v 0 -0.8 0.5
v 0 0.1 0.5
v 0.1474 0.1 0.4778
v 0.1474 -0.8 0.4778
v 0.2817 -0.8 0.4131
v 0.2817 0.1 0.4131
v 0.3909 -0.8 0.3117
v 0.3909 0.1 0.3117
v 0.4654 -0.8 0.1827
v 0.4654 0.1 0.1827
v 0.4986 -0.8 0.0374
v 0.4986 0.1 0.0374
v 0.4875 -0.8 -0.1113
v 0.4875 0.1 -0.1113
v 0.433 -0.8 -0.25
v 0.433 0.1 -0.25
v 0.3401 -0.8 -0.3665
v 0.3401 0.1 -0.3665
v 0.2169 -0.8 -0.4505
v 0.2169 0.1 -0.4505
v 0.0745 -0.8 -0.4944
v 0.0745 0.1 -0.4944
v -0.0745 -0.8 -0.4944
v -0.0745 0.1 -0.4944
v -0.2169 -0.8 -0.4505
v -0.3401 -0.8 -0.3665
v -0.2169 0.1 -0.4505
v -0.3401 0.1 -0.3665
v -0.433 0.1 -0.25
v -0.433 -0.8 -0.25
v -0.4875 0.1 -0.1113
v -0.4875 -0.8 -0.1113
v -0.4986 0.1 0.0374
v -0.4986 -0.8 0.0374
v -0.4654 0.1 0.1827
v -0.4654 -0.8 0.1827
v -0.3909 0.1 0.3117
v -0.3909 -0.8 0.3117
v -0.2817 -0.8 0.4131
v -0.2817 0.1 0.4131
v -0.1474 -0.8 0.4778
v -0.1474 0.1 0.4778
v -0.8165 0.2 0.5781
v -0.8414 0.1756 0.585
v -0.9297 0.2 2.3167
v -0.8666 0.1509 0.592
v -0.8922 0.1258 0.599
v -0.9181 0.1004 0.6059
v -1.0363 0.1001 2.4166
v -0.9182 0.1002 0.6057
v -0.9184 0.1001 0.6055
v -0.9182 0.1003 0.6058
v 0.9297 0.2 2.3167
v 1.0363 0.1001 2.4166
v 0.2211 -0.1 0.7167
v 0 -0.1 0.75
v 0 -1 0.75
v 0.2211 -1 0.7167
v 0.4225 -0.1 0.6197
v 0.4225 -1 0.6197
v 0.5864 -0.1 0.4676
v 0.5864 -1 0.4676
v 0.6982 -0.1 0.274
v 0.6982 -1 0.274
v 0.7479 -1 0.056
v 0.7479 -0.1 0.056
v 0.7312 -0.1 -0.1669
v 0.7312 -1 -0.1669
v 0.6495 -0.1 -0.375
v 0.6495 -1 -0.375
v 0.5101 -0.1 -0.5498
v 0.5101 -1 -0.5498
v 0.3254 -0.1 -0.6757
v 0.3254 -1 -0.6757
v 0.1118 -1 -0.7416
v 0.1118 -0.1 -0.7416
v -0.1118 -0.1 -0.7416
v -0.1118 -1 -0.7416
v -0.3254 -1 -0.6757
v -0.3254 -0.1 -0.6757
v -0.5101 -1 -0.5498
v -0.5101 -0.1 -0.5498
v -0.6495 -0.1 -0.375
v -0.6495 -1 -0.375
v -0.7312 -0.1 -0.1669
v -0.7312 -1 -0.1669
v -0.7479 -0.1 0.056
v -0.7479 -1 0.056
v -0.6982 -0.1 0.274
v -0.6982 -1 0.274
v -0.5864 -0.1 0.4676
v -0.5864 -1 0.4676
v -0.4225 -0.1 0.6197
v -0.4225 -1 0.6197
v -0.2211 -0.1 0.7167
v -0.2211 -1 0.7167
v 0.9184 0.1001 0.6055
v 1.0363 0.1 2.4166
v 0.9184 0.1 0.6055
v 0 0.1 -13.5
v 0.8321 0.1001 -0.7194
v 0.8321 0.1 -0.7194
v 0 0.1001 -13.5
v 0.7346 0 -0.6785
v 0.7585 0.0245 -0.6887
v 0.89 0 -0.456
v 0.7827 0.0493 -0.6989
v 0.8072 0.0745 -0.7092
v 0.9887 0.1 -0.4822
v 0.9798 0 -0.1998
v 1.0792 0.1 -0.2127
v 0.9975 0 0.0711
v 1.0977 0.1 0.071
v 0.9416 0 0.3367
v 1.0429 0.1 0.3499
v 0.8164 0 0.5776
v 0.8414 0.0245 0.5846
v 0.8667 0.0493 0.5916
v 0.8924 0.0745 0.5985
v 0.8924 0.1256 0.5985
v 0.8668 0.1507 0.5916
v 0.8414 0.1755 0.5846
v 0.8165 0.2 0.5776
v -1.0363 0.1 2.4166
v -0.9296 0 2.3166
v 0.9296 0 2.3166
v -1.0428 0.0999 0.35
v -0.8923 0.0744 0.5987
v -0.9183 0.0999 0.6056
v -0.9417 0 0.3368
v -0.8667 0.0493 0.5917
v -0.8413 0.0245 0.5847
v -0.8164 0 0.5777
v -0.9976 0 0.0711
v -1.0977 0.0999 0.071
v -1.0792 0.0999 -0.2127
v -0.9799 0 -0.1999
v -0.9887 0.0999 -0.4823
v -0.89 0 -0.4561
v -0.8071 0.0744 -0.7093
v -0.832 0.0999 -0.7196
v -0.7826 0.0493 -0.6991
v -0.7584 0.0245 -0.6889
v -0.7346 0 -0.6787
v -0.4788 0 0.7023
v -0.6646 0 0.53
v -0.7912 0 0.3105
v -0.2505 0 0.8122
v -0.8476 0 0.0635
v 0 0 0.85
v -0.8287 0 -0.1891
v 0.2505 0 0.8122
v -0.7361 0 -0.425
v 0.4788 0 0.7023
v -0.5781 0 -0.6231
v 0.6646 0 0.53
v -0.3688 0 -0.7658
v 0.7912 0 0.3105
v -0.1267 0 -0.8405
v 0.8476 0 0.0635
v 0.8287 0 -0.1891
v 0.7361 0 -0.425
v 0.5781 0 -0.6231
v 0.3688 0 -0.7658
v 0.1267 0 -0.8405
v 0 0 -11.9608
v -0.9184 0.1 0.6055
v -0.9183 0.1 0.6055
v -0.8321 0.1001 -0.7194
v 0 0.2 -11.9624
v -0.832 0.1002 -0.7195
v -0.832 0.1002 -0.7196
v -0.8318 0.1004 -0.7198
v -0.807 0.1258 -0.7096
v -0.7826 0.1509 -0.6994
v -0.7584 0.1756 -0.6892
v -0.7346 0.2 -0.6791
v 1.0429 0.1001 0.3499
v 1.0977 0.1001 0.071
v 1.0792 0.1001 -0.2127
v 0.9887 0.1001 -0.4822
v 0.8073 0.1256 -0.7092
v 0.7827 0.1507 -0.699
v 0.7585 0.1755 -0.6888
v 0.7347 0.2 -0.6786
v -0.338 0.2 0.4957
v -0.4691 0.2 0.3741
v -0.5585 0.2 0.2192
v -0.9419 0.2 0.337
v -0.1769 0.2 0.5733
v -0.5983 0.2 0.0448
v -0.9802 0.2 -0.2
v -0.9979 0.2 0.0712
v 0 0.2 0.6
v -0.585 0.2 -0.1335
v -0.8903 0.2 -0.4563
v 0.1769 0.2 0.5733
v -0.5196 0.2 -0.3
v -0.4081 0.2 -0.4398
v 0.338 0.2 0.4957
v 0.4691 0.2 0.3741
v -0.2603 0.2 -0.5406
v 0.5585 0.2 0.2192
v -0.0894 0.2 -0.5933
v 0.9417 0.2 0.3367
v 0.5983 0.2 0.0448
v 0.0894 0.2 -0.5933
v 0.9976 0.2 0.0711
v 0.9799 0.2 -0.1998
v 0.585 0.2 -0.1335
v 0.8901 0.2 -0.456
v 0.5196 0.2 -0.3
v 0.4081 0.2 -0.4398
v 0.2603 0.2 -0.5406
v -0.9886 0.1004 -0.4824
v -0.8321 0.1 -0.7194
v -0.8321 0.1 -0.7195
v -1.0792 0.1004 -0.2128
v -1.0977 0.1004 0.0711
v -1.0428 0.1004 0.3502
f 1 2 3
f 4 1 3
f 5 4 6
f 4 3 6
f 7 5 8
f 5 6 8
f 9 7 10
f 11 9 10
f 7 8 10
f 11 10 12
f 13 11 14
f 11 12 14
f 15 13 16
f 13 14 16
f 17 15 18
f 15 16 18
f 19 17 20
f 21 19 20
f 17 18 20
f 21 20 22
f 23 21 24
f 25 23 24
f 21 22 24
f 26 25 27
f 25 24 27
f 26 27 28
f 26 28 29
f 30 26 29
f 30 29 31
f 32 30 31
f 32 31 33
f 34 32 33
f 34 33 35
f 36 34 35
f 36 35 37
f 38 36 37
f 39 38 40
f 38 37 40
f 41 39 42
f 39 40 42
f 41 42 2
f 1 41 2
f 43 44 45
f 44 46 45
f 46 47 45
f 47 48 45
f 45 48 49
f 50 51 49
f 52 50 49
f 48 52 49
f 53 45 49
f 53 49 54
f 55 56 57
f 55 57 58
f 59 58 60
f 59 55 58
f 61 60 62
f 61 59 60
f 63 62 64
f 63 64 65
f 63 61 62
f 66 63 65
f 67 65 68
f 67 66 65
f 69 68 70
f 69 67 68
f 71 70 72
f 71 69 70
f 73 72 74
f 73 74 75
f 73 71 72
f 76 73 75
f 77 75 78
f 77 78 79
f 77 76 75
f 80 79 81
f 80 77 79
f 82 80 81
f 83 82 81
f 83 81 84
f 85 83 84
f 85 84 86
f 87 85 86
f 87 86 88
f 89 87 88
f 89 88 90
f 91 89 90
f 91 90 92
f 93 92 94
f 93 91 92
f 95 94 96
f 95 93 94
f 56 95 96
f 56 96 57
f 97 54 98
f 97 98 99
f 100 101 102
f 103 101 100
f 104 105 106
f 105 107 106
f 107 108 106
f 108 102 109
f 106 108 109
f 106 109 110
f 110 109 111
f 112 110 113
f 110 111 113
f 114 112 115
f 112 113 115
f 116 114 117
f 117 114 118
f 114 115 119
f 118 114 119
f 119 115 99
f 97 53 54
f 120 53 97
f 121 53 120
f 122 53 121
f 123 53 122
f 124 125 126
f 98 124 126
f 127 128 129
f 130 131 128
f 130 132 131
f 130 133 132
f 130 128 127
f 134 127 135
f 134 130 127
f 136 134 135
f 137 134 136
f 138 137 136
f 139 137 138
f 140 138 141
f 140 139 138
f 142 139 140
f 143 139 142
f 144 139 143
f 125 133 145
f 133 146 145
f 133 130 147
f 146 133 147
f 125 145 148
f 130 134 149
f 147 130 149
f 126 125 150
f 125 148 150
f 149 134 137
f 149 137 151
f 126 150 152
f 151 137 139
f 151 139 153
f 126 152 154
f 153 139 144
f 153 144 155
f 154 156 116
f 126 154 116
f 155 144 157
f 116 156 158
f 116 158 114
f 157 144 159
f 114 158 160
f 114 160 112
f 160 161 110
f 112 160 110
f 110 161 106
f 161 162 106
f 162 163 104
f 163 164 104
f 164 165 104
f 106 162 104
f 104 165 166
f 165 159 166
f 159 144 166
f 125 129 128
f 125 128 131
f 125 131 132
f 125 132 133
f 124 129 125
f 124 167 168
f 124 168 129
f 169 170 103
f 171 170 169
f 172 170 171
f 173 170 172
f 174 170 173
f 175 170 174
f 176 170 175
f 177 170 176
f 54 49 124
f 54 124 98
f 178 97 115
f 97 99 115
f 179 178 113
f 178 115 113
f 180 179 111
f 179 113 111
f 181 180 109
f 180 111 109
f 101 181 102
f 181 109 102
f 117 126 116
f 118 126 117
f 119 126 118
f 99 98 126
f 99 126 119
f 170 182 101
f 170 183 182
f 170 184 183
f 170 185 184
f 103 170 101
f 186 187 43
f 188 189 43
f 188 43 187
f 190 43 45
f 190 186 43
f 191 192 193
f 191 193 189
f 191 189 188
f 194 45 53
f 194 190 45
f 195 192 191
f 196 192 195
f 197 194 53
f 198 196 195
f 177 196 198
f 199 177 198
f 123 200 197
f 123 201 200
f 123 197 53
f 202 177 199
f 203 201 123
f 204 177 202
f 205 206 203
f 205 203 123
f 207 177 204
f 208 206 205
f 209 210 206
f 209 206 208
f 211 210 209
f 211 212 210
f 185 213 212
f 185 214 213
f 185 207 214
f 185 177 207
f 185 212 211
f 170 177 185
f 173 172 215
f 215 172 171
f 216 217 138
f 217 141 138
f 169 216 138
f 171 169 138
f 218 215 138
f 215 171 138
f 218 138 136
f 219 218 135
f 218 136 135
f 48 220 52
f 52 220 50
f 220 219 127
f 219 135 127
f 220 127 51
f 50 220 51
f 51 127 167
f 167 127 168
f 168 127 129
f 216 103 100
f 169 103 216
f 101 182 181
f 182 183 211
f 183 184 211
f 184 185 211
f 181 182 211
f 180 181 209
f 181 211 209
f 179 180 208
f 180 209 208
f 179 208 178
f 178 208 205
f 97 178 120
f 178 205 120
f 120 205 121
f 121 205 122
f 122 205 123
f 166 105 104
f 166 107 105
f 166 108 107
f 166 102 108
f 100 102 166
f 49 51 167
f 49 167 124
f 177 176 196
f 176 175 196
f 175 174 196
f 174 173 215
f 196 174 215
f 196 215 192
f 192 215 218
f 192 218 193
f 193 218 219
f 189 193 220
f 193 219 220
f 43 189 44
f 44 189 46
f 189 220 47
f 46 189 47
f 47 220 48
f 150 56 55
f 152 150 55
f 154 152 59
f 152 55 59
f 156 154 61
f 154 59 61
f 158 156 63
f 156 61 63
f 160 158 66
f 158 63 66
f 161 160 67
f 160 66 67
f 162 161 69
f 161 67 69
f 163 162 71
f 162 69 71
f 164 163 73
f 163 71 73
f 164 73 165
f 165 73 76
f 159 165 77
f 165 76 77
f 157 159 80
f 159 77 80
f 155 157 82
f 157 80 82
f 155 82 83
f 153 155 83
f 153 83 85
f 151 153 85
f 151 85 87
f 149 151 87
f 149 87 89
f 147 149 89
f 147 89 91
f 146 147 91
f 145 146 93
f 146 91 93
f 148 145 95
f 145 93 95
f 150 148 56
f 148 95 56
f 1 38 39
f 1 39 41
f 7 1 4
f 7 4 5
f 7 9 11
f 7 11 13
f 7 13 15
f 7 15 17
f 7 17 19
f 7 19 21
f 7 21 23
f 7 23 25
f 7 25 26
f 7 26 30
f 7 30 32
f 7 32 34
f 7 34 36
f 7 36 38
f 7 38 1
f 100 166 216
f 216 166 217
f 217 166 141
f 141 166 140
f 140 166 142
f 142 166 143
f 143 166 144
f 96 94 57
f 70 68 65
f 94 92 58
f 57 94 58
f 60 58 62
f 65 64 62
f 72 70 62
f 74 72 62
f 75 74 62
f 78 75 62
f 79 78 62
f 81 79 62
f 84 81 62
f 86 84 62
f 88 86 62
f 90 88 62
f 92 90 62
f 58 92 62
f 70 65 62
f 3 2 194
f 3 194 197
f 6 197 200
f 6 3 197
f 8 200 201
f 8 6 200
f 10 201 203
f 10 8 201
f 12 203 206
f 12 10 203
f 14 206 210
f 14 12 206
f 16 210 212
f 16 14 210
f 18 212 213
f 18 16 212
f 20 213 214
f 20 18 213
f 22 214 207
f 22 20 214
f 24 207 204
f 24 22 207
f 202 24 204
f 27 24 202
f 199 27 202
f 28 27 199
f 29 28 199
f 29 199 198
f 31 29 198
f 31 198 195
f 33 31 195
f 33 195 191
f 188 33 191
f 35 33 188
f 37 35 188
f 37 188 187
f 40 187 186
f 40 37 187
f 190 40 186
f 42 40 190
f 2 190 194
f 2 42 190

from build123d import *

# Parameters (mm, degrees)
SKETCH2_R           = 0.75
BOSS_EXTRUDE1_DEPTH = 1
SKETCH3_R           = 1.1
BOSS_EXTRUDE2_DEPTH = 0.2
BOSS_EXTRUDE3_DEPTH = 0.2
SKETCH5_R           = 0.5
CUT_EXTRUDE1_DEPTH  = 1
CHAMFER1_SIZE       = 0.1


with BuildPart() as part:
    # Sketch2 → Boss-Extrude1 (new body)
    with BuildSketch(Plane(origin=(0, 0, 0), x_dir=(1, 0, 0), z_dir=(0, 1, 0))):
        with Locations(Location((0, 0, 0), (0, 0, 270))):
            Circle(SKETCH2_R)
    extrude(amount=-BOSS_EXTRUDE1_DEPTH)

    # Sketch3 → Boss-Extrude2 (add)
    with BuildSketch(Plane(origin=(0, 0, 0), x_dir=(1, 0, 0), z_dir=(0, 1, 0))):
        with Locations(Location((0, 0, 0), (0, 0, 270))):
            Circle(SKETCH3_R)
    extrude(amount=BOSS_EXTRUDE2_DEPTH)

    # Sketch4 → Boss-Extrude3 (add)
    with BuildSketch(Plane(origin=(0, 0.2, 0), x_dir=(1, 0, 0), z_dir=(0, 1, 0))):
        Polygon((0, 13.5), (-1.036300873, -2.416623366), (1.036300873, -2.416623366), align=None)
    extrude(amount=-BOSS_EXTRUDE3_DEPTH)

    # Sketch5 → Cut-Extrude1 (cut)
    with BuildSketch(Plane(origin=(0, 0.2, 0), x_dir=(1, 0, 0), z_dir=(0, 1, 0))):
        with Locations(Location((0, 0, 0), (0, 0, 270))):
            Circle(SKETCH5_R)
    extrude(amount=-CUT_EXTRUDE1_DEPTH, mode=Mode.SUBTRACT)

    # Chamfer1
    chamfer1_edges = [part.edges().sort_by_distance(p)[0] for p in [
        (0.416059237, 0, -7.109714764),
    ]]
    chamfer(chamfer1_edges, length=CHAMFER1_SIZE)
    chamfer1_2_edges = [part.edges().sort_by_distance(p)[0] for p in [
        (-0.441112169, 0, -6.724924886),
    ]]
    chamfer(chamfer1_2_edges, length=CHAMFER1_SIZE)
    chamfer1_3_edges = [part.edges().sort_by_distance(p)[0] for p in [
        (0.416059237, 0.2, -7.109714764),
    ]]
    chamfer(chamfer1_3_edges, length=CHAMFER1_SIZE - 0.0001)  # a hair under: the kernel refuses the full size
    chamfer1_4_edges = [part.edges().sort_by_distance(p)[0] for p in [
        (-0.441087116, 0.2, -6.725309676),
    ]]
    chamfer(chamfer1_4_edges, length=CHAMFER1_SIZE - 0.0001)  # a hair under: the kernel refuses the full size
    chamfer1_5_edges = [part.edges().sort_by_distance(p)[0] for p in [
        (0, 0, -0.75),
    ]]
    chamfer(chamfer1_5_edges, length=CHAMFER1_SIZE)
    chamfer1_6_edges = [part.edges().sort_by_distance(p)[0] for p in [
        (0, 0.2, -0.5),
    ]]
    chamfer(chamfer1_6_edges, length=CHAMFER1_SIZE)
    chamfer1_7_edges = [part.edges().sort_by_distance(p)[0] for p in [
        (0, 0, 2.416623366),
    ]]
    chamfer(chamfer1_7_edges, length=CHAMFER1_SIZE)
    chamfer1_8_edges = [part.edges().sort_by_distance(p)[0] for p in [
        (0, 0.2, 2.416623366),
    ]]
    chamfer(chamfer1_8_edges, length=CHAMFER1_SIZE - 0.0001)  # a hair under: the kernel refuses the full size
    chamfer1_9_edges = [part.edges().sort_by_distance(p)[0] for p in [
        (0.974084713, 0, 1.461040666),
    ]]
    chamfer(chamfer1_9_edges, length=CHAMFER1_SIZE)
    chamfer1_10_edges = [part.edges().sort_by_distance(p)[0] for p in [
        (0.974087969, 0.2, 1.461090666),
    ]]
    chamfer(chamfer1_10_edges, length=CHAMFER1_SIZE - 0.0001)  # a hair under: the kernel refuses the full size
    chamfer1_11_edges = [part.edges().sort_by_distance(p)[0] for p in [
        (-0.974084713, 0, 1.461040666),
    ]]
    chamfer(chamfer1_11_edges, length=CHAMFER1_SIZE)
    chamfer1_12_edges = [part.edges().sort_by_distance(p)[0] for p in [
        (-0.974087969, 0.2, 1.461090666),
    ]]
    chamfer(chamfer1_12_edges, length=CHAMFER1_SIZE - 0.0001)  # a hair under: the kernel refuses the full size
    chamfer1_13_edges = [part.edges().sort_by_distance(p)[0] for p in [
        (1.097675902, 0, -0.071467576),
    ]]
    chamfer(chamfer1_13_edges, length=CHAMFER1_SIZE)
    chamfer1_14_edges = [part.edges().sort_by_distance(p)[0] for p in [
        (1.097675902, 0.2, -0.071467576),
    ]]
    chamfer(chamfer1_14_edges, length=CHAMFER1_SIZE - 0.0001)  # a hair under: the kernel refuses the full size
    chamfer1_15_edges = [part.edges().sort_by_distance(p)[0] for p in [
        (-1.097675902, 0, -0.071467576),
    ]]
    chamfer(chamfer1_15_edges, length=CHAMFER1_SIZE - 0.0001)  # a hair under: the kernel refuses the full size
    chamfer1_16_edges = [part.edges().sort_by_distance(p)[0] for p in [
        (-1.097675902, 0.2, -0.071467576),
    ]]
    chamfer(chamfer1_16_edges, length=CHAMFER1_SIZE - 0.0004)  # a hair under: the kernel refuses the full size


solid = part.part
